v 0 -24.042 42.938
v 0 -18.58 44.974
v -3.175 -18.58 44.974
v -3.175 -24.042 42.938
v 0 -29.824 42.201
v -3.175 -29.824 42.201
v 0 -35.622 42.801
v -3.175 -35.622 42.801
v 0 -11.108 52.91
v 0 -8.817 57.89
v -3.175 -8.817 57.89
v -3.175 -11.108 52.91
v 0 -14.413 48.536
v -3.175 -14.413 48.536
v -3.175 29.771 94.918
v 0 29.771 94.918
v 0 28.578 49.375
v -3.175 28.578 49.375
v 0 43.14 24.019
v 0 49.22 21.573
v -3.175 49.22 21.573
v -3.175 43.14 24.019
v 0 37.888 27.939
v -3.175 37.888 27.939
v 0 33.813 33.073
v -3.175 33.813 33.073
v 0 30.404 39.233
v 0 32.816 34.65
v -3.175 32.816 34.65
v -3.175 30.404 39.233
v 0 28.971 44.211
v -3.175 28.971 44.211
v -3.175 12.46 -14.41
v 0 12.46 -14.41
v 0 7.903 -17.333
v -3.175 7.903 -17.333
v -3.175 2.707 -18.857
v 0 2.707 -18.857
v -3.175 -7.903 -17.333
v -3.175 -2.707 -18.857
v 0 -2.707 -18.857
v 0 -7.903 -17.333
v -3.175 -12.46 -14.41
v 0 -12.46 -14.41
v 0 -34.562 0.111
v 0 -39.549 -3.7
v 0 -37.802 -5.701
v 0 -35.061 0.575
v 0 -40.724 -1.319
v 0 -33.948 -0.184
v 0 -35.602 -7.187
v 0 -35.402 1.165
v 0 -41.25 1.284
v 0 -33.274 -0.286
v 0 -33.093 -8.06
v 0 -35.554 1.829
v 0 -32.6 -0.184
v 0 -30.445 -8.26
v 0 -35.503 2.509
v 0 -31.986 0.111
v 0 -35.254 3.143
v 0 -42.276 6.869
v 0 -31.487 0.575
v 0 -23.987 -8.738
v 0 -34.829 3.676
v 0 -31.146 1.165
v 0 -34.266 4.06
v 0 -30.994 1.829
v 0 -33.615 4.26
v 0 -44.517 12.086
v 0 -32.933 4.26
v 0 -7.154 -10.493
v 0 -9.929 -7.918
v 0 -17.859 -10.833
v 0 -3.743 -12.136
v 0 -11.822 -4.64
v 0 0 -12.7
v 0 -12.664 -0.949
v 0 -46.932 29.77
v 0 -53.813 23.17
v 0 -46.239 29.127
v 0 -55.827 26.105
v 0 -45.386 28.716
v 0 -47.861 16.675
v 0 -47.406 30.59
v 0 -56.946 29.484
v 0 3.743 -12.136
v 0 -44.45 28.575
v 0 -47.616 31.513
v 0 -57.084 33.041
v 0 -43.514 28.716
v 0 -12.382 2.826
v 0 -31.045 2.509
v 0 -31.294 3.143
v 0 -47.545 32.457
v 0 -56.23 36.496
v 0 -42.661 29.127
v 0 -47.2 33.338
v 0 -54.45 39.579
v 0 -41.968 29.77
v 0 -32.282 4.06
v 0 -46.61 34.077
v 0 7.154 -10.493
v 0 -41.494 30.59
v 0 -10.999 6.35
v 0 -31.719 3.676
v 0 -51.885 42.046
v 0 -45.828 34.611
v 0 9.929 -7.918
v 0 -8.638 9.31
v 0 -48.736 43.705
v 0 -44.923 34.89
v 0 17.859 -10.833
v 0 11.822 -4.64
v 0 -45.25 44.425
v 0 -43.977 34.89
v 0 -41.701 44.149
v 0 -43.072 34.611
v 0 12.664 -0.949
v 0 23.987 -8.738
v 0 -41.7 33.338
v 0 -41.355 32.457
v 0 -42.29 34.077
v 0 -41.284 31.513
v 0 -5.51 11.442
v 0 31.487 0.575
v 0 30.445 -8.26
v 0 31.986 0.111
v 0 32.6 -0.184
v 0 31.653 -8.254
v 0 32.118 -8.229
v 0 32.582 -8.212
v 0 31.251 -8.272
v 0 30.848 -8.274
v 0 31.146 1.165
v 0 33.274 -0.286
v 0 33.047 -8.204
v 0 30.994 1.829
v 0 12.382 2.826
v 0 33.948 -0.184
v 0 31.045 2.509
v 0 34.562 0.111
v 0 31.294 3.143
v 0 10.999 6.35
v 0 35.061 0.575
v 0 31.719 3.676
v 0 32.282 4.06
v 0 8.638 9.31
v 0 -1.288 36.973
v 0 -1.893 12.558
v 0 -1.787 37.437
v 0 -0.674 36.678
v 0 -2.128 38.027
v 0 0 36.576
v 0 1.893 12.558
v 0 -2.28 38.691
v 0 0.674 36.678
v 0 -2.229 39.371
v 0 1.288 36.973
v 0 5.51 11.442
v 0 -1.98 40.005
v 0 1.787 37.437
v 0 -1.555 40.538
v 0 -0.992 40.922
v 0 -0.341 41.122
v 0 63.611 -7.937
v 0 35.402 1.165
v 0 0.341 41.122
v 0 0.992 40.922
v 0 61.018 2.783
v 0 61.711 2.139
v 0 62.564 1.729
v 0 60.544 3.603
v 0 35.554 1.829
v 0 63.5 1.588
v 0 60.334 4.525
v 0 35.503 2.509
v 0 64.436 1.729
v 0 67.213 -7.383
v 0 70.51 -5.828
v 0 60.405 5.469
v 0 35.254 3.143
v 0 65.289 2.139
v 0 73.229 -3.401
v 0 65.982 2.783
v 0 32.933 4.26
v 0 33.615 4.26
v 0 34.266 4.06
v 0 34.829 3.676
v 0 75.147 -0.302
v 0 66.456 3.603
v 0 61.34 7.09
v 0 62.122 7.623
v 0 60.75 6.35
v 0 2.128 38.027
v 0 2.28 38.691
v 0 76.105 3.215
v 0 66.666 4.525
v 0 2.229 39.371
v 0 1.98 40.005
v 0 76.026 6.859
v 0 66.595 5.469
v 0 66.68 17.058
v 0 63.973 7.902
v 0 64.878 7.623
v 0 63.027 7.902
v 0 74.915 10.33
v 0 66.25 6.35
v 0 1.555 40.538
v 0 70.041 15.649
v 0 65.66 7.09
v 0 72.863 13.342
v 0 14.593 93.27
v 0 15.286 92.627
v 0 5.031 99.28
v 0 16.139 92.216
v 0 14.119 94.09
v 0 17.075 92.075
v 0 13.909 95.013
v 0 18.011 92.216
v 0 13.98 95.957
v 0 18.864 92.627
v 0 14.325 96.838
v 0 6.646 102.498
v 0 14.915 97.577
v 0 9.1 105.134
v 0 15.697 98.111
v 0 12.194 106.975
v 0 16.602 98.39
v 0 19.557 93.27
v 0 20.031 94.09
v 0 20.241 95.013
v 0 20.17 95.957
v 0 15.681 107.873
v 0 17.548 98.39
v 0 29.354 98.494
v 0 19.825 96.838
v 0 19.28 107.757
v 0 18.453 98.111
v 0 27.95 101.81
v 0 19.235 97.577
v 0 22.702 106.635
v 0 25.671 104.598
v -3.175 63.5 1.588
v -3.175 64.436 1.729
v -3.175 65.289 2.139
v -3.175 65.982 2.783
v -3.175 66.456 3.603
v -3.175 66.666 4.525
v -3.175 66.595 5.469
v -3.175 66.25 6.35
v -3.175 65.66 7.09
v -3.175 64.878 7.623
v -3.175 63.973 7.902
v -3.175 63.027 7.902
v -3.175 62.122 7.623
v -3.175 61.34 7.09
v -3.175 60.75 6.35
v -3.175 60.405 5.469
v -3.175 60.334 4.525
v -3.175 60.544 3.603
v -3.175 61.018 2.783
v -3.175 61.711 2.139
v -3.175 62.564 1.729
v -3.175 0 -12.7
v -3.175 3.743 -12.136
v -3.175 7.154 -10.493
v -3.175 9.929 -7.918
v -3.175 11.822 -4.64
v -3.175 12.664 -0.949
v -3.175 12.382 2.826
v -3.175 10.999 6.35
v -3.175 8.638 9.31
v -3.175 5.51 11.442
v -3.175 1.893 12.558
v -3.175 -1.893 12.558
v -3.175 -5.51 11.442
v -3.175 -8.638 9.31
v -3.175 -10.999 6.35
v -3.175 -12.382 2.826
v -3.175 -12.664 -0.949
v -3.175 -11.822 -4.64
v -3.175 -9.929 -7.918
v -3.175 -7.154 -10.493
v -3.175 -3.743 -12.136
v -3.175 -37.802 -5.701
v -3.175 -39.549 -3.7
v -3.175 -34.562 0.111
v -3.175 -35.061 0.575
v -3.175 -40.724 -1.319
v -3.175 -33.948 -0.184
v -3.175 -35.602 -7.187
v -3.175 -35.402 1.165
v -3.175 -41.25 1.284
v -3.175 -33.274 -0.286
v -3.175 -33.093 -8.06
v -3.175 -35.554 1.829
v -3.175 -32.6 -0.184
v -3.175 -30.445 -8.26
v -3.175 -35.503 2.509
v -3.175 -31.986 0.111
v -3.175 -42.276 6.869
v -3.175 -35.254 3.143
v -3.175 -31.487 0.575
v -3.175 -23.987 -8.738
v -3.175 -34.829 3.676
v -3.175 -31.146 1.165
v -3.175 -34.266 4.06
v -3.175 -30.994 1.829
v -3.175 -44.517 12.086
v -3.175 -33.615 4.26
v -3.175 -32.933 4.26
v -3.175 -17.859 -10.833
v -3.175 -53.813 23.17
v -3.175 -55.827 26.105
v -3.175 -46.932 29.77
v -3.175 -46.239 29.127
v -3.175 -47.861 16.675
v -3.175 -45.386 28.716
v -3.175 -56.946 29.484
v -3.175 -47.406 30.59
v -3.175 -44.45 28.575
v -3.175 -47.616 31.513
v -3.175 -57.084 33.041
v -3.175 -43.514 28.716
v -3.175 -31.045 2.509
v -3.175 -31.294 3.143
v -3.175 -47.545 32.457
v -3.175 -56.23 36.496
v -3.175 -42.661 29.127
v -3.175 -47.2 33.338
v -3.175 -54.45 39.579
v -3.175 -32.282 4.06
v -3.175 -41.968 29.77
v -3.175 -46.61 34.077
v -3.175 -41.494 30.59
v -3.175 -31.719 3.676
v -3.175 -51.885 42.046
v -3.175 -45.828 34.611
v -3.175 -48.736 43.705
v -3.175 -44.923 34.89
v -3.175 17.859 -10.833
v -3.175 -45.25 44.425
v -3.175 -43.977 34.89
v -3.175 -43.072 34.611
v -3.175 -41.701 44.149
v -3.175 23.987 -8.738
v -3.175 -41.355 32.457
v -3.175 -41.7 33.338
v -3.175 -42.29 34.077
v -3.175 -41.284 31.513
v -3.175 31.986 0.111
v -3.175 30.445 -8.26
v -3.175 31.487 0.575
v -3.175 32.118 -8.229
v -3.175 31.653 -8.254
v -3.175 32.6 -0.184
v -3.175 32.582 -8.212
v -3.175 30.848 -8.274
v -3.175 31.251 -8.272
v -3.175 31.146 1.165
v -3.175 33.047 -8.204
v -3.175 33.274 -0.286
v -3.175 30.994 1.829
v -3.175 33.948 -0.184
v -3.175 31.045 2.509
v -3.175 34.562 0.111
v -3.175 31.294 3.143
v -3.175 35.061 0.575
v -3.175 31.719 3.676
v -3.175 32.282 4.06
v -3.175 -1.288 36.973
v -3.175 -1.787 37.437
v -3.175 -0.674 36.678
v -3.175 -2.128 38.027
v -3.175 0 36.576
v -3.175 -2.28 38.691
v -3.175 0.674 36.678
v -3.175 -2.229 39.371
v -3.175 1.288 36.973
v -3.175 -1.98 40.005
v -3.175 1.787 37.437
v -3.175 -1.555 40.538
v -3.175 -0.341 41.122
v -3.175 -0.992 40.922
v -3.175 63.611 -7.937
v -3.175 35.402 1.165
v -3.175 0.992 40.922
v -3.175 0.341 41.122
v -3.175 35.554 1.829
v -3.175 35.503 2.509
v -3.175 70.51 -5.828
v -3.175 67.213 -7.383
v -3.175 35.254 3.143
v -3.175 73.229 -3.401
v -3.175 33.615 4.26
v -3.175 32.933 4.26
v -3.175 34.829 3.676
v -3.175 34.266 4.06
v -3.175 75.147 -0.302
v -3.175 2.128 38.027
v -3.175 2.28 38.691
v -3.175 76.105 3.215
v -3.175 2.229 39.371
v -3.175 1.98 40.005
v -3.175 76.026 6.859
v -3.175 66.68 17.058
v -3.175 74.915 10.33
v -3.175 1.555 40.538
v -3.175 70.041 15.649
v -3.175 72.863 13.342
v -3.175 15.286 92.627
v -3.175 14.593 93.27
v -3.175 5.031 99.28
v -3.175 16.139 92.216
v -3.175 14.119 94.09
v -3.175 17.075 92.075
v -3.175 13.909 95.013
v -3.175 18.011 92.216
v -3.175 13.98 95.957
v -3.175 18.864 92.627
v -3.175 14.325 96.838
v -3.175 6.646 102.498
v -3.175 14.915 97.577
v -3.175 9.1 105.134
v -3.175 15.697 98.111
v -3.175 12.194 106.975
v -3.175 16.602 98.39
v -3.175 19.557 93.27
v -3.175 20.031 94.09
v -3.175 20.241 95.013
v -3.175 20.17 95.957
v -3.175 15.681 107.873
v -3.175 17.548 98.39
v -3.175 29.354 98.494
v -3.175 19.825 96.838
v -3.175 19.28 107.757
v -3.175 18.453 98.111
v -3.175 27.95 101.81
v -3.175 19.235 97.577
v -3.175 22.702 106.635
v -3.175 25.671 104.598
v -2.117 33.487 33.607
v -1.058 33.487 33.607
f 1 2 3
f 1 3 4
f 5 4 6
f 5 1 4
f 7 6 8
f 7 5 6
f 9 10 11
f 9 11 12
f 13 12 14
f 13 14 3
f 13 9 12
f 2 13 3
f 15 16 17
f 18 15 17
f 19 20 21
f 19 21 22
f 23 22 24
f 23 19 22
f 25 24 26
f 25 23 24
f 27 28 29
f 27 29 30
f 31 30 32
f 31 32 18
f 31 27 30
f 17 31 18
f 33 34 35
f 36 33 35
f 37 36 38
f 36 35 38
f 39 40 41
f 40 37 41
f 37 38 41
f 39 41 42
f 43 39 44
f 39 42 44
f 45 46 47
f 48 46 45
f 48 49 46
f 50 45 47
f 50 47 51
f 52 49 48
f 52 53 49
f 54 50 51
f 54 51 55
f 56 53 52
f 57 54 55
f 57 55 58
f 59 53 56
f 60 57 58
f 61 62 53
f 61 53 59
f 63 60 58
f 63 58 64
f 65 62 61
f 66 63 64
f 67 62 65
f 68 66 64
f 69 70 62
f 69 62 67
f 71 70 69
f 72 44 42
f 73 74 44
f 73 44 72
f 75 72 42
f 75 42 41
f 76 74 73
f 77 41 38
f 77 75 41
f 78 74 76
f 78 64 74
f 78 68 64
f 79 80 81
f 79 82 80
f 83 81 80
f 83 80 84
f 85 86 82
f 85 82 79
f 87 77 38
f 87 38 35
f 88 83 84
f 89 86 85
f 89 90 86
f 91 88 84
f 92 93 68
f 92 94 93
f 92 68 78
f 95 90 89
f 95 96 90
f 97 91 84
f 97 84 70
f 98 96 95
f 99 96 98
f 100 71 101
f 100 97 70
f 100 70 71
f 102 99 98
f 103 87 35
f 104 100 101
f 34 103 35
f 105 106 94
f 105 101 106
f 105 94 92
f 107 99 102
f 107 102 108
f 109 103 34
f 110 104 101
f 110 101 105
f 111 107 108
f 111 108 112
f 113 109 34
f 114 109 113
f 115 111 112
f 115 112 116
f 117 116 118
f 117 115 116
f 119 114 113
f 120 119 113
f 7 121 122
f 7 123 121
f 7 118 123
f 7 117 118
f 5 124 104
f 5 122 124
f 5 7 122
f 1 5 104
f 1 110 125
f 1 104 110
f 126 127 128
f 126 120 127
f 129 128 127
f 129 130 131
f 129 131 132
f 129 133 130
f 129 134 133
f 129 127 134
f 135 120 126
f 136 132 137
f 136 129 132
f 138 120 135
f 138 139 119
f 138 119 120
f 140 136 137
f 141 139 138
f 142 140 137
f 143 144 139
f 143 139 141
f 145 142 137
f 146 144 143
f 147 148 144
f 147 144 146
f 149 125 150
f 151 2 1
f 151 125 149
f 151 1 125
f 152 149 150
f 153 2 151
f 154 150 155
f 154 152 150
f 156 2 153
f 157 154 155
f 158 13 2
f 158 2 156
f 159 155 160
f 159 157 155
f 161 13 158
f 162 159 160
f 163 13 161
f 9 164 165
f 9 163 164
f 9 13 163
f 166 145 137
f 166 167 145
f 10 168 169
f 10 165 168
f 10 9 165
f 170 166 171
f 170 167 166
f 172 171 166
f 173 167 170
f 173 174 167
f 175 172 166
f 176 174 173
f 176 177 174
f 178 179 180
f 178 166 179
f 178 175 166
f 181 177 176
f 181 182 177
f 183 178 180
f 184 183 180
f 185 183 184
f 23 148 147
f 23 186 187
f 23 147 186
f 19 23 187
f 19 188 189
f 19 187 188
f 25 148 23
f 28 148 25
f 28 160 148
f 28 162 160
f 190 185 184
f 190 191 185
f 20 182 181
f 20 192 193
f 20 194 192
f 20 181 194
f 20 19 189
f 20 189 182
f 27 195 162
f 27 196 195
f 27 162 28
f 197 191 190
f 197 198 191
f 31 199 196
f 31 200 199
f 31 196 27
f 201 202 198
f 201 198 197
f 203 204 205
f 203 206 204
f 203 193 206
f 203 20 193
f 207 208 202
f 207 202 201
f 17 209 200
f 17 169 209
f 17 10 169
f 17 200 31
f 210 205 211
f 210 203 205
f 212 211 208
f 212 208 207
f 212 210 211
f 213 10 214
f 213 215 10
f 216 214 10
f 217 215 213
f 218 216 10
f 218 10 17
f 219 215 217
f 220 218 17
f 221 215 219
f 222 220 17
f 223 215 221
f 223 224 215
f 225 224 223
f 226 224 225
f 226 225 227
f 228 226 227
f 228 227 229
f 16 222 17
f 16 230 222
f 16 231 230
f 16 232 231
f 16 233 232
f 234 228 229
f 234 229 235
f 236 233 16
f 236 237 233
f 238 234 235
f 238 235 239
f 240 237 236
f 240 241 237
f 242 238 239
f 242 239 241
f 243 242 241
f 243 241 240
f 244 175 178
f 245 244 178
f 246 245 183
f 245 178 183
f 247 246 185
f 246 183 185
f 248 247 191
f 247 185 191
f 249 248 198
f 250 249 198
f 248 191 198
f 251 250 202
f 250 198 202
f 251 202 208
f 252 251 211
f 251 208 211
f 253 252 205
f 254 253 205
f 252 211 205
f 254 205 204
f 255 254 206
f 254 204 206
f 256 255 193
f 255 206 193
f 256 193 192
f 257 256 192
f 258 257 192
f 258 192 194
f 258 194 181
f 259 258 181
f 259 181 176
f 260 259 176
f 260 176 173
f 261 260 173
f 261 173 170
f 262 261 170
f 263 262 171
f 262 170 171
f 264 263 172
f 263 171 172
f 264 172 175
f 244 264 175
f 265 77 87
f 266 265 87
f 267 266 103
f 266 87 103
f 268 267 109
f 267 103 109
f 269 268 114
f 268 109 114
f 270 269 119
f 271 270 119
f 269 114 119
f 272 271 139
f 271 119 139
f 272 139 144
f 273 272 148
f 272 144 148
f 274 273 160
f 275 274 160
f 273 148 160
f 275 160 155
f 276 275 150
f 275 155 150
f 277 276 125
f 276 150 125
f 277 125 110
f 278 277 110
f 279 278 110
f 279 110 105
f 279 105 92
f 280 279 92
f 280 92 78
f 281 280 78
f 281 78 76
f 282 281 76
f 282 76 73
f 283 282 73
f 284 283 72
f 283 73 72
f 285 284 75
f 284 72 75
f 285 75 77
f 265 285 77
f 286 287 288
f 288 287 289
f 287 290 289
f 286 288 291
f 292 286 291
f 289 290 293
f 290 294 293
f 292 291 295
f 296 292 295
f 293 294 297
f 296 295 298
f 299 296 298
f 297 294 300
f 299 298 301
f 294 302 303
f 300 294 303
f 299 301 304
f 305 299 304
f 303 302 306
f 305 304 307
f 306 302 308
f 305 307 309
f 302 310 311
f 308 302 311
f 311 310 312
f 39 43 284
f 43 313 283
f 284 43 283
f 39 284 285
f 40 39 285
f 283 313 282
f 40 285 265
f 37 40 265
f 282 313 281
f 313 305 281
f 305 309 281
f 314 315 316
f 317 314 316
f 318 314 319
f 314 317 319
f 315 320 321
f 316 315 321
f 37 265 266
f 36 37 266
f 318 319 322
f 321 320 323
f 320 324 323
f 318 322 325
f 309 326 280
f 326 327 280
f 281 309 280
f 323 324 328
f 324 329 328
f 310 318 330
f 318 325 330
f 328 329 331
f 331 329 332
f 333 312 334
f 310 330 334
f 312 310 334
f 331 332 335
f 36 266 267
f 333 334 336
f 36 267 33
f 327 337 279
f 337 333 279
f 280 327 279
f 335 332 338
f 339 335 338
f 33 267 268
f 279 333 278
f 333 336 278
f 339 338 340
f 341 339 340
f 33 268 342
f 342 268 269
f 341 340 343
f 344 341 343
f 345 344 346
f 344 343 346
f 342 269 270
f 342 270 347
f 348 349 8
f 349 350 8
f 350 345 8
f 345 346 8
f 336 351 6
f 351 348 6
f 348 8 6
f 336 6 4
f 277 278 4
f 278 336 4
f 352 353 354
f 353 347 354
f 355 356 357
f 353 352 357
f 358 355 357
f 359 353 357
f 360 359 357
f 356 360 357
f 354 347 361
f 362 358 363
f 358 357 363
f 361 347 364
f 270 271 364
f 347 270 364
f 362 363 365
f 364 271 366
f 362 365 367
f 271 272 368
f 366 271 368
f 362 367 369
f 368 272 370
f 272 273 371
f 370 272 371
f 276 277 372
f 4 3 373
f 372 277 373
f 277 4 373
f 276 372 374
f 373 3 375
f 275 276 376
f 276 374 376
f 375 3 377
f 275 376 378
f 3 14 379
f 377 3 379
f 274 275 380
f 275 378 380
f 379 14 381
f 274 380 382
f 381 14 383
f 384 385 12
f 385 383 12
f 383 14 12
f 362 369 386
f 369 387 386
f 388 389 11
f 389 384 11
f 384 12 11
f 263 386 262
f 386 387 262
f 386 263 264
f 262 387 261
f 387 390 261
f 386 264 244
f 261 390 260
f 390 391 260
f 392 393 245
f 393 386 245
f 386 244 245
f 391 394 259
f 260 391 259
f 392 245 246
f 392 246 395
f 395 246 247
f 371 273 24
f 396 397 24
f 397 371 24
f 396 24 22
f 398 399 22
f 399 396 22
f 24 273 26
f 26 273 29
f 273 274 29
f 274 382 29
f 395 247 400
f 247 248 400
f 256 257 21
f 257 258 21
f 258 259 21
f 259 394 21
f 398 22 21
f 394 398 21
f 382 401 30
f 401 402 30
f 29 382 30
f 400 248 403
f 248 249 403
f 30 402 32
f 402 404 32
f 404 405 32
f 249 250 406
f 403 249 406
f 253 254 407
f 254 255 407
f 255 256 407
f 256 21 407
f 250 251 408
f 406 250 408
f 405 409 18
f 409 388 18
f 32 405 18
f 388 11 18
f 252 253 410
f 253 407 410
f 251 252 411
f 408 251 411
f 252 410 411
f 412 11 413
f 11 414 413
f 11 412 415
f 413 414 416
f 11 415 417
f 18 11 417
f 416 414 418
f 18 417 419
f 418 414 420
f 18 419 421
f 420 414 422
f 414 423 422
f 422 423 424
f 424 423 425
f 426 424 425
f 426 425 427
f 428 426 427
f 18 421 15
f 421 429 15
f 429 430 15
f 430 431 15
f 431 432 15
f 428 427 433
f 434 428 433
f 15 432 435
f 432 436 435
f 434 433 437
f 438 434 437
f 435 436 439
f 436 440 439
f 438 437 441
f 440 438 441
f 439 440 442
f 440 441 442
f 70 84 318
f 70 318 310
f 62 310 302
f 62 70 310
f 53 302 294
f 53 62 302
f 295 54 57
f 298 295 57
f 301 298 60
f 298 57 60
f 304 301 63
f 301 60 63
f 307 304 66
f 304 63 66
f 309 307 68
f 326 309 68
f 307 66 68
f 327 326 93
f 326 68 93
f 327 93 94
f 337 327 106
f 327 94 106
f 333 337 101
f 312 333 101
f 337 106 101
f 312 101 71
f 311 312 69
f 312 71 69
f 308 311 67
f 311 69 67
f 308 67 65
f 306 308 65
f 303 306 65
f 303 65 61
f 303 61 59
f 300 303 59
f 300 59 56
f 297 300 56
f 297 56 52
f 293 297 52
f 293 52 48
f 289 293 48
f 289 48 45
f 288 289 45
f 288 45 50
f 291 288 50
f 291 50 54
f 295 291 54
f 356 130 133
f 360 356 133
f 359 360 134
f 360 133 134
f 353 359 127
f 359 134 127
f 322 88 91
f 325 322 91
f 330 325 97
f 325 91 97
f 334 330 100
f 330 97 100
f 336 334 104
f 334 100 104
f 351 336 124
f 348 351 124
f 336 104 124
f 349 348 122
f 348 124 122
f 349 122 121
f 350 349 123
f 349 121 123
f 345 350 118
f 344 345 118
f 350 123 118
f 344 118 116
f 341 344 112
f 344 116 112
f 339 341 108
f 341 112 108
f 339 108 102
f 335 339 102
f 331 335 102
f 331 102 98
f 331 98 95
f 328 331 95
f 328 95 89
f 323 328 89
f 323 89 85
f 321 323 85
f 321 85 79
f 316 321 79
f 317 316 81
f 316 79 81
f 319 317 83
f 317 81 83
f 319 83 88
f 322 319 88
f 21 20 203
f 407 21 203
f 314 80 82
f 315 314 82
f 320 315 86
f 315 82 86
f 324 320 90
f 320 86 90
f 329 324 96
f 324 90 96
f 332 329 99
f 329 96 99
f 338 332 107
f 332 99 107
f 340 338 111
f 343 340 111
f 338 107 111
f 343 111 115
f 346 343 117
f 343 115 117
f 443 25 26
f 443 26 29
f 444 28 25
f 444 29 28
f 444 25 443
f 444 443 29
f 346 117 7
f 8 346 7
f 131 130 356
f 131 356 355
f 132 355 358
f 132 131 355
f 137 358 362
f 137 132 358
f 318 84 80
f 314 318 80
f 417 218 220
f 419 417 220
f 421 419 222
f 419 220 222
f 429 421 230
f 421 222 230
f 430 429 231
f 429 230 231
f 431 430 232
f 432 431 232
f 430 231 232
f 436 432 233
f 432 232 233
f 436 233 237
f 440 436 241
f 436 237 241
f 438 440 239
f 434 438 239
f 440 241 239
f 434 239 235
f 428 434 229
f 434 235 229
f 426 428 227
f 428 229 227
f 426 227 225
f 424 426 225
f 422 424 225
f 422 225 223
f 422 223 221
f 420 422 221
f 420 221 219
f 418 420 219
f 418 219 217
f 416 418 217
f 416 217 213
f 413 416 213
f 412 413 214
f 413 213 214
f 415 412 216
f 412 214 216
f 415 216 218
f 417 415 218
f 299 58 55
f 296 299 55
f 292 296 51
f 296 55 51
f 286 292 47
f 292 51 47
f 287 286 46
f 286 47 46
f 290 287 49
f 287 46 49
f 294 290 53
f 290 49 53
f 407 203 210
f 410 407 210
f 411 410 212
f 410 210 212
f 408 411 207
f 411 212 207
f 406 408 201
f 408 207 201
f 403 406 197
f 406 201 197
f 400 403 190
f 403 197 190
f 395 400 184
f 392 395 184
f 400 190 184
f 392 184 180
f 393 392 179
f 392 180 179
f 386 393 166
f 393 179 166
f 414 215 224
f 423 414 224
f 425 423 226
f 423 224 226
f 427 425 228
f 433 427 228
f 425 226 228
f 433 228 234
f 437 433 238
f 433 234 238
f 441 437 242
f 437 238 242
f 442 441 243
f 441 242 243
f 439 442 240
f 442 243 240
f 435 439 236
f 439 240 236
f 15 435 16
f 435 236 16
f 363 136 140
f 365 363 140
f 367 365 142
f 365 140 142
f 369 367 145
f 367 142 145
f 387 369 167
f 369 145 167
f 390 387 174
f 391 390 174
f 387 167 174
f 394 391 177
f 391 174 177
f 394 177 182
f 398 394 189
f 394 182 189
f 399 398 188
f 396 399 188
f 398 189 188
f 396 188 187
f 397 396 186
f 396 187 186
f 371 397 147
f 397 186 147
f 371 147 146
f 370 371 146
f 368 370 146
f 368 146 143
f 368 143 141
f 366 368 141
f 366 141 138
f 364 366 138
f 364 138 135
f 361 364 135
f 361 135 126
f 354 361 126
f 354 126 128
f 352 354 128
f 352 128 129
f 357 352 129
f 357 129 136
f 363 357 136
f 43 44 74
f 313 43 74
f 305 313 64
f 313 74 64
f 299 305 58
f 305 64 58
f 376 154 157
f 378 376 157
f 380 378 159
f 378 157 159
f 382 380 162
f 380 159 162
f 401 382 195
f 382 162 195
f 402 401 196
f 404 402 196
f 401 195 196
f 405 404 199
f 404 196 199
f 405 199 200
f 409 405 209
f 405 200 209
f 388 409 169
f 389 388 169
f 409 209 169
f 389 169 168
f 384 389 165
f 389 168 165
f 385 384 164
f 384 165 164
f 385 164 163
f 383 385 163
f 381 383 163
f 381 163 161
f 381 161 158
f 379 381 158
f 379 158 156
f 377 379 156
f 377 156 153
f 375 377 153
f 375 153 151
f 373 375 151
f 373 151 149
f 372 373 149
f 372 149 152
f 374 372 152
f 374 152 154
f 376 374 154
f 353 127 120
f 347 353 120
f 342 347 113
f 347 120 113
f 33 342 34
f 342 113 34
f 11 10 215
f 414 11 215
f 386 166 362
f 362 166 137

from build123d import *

# Parameters (mm, degrees)
SKETCH1_W          = 101.6
SKETCH1_H          = 82.55
SKETCH1_R          = 12.7
BASE_FLANGE1_DEPTH = 3.175
SKETCH6_R          = 2.286
CUT_EXTRUDE1_DEPTH = 66.531261624
SKETCH7_R          = 3.175
TAB1_DEPTH         = 3.175
FILLET1_R          = 25.4


# Sheet-metal steps are written as plain solids
with BuildPart() as part:
    # Sketch1 → Base-Flange1 (new body)
    with BuildSketch(Plane(origin=(0, 0, 0), x_dir=(0, 0, -1), z_dir=(1, 0, 0))):
        Rectangle(SKETCH1_W, SKETCH1_H)
        Circle(SKETCH1_R, mode=Mode.SUBTRACT)
    extrude(amount=-BASE_FLANGE1_DEPTH)

    # Sketch6 → Cut-Extrude1 (cut, through all)
    with BuildSketch(Plane(origin=(0, 0, 0), x_dir=(0, 0, -1), z_dir=(1, 0, 0))):
        with BuildLine():
            Line((-50.8, 0), (-50.8, -41.275))
            Line((-50.8, -41.275), (-2, -41.275))
            add(Edge.make_bspline(
                [(-50.8, 0), (-49.405200746, -20.6375), (-31.743734825, -41.275), (-2, -41.275)],
                knots=[0.5, 0.5, 0.5, 0.5, 1, 1, 1, 1], degree=3))
        make_face()
        with BuildLine():
            ThreePointArc((8.260015314, -30.445283168), (5.45906631, -38.06667919), (-2, -41.275))
            Line((-2, -41.275), (50.8, -41.275))
            Line((50.8, -41.275), (50.8, 41.275))
            Line((50.8, 41.275), (-2, 41.275))
            ThreePointArc((-2, 41.275), (5.45906631, 38.06667919), (8.260015314, 30.445283168))
            ThreePointArc((8.260015314, 30.445283168), (9.58920866, 20.855850918), (14.409845519, 12.460291013))
            ThreePointArc((14.409845519, 12.460291013), (19.05, 0), (14.409845519, -12.460291013))
            ThreePointArc((14.409845519, -12.460291013), (9.58920866, -20.855850918), (8.260015314, -30.445283168))
        make_face()
        with BuildLine():
            Line((-50.8, 41.275), (-50.8, 5.257542394))
            add(Edge.make_bspline(
                [(-2, 41.275), (-34.31608403, 41.275), (-49.514685749, 24.001471649), (-50.8, 5.257542394)],
                knots=[0, 0, 0, 0, 0.457437737, 0.457437737, 0.457437737, 0.457437737], degree=3))
            Line((-2, 41.275), (-50.8, 41.275))
        make_face()
        with Locations((-38.862, 0)):
            Circle(SKETCH6_R)
        with Locations((-2, -33.274)):
            Circle(SKETCH6_R)
        with Locations((-2, 33.274)):
            Circle(SKETCH6_R)
    extrude(amount=-CUT_EXTRUDE1_DEPTH, mode=Mode.SUBTRACT)

    # Sketch7 → Tab1 (add)
    # profile 1 of 3: a face of its own
    with BuildSketch(Plane(origin=(0, 0, 0), x_dir=(0, 0, -1), z_dir=(1, 0, 0))):
        with BuildLine():
            Line((-94.917552756, 29.770648167), (-40.208700014, 28.33804644))
            add(Edge.make_bspline(
                [(-40.208700014, 28.33804644), (-46.786875633, 21.92230562), (-50.218303551, 13.740508394), (-50.8, 5.257542394)],
                knots=[0.250414508, 0.250414508, 0.250414508, 0.250414508, 0.457437737, 0.457437737, 0.457437737, 0.457437737], degree=3))
            Line((-50.8, 5.257542394), (-50.8, 0))
            add(Edge.make_bspline(
                [(-50.8, 0), (-50.523888569, -4.085354674), (-49.610330365, -8.170709348), (-48.091785573, -12.095969996)],
                knots=[0.5, 0.5, 0.5, 0.5, 0.598978914, 0.598978914, 0.598978914, 0.598978914], degree=3))
            Line((-48.091785573, -12.095969996), (-99.279769136, 5.031289719))
            ThreePointArc((-99.279769136, 5.031289719), (-107.757058463, 19.280331996), (-94.917552756, 29.770648167))
        make_face()
        with Locations((-95.25, 17.07500014)):
            Circle(SKETCH7_R, mode=Mode.SUBTRACT)
    # profile 2 of 3: a face of its own
    with BuildSketch(Plane(origin=(0, 0, 0), x_dir=(0, 0, -1), z_dir=(1, 0, 0))):
        with BuildLine():
            Line((-44.14895929, -41.701216903), (-40.415374595, -24.860104669))
            add(Edge.make_bspline(
                [(-40.415374595, -24.860104669), (-33.280436064, -33.135041664), (-22.659787261, -39.285311117), (-9.047775931, -40.872784018)],
                knots=[0.713798262, 0.713798262, 0.713798262, 0.713798262, 0.959139114, 0.959139114, 0.959139114, 0.959139114], degree=3))
            Line((-9.047775931, -40.872784018), (-23.170004363, -53.813422177))
            ThreePointArc((-23.170004363, -53.813422177), (-38.1, -55.448522628), (-44.14895929, -41.701216903))
        make_face()
        with Locations((-31.75, -44.45)):
            Circle(SKETCH7_R, mode=Mode.SUBTRACT)
    # profile 3 of 3: a face of its own
    with BuildSketch(Plane(origin=(0, 0, 0), x_dir=(0, 0, -1), z_dir=(1, 0, 0))):
        with BuildLine():
            Line((7.937016423, 63.610827001), (8.211666218, 32.13907772))
            ThreePointArc((8.211666218, 32.13907772), (4.850970786, 38.657664415), (-2, 41.275))
            add(Edge.make_bspline(
                [(-2, 41.275), (-10.740165269, 41.275), (-18.228222741, 40.011477764), (-24.527562549, 37.79707419)],
                knots=[0, 0, 0, 0, 0.123718004, 0.123718004, 0.123718004, 0.123718004], degree=3))
            Line((-24.527562549, 37.79707419), (-17.057975033, 66.679826051))
            ThreePointArc((-17.057975033, 66.679826051), (-3.214759339, 76.105336126), (7.937016423, 63.610827001))
        make_face()
        with Locations((-4.7625, 63.5)):
            Circle(SKETCH7_R, mode=Mode.SUBTRACT)
    extrude(amount=-TAB1_DEPTH)

    # Fillet1
    # the kernel refuses this fillet: 25.4 mm, written as the material it adds along each edge
    with BuildSketch(Plane(origin=(0, -12.095969996, 48.091785573), x_dir=(0, -0.8940853076070706, -0.44789670987982283), z_dir=(-1, 0, 0))) as fillet1_piece_1:
        with BuildLine():
            CenterArc((10.606420456, 25.28678712), FILLET1_R, 225.10881891, 39.479525683)
            Line((-7.319947942, 7.29219582), (-7.67847531, 6.932303994))
            Line((-7.67847531, 6.932303994), (-0.358527368, -0.359891826))
            Line((-0.358527368, -0.359891826), (0.04832888, -0.505695876))
            ThreePointArc((0.04832888, -0.505695876), (4.105397819, -0.313189565), (8.163015374, -0.505735742))
            Line((8.163015374, -0.505735742), (8.210925278, 0))
        make_face()
    extrude(amount=3.175)
    with BuildSketch(Plane(origin=(0, -24.860104669, 40.415374595), x_dir=(0, 0.8184198405618281, 0.5746207136666339), z_dir=(-1, 0, 0))) as fillet1_piece_2:
        with BuildLine():
            CenterArc((11.311656293, -25.273029086), FILLET1_R, 95.731310995, 41.841763873)
            Line((-7.437058628, -8.136935925), (-7.812032926, -7.794214062))
            Line((-7.812032926, -7.794214062), (-0.374974298, 0.342721863))
            Line((-0.374974298, 0.342721863), (0.050418969, 0.505491768))
            ThreePointArc((0.050418969, 0.505491768), (4.387605763, 0.289082367), (8.724392403, 0.505460582))
            Line((8.724392403, 0.505460582), (8.775123067, 0))
        make_face()
    extrude(amount=3.175)
    with BuildSketch(Plane(origin=(0, -40.872784018, 9.047775931), x_dir=(0, -0.04853483979472319, -0.9988214902204), z_dir=(-1, 0, 0))) as fillet1_piece_3:
        with BuildLine():
            CenterArc((10.770038636, 25.222537483), FILLET1_R, 224.718065589, 38.505093781)
            Line((-7.27863381, 7.350620325), (-9.083501055, 5.563428609))
            Line((-9.083501055, 5.563428609), (-1.804867245, -1.787191716))
            Line((-1.804867245, -1.787191716), (0.171432812, -2.534208119))
            ThreePointArc((0.171432812, -2.534208119), (6.935713053, -2.477327294), (7.473046138, -2.522253748))
            Line((7.473046138, -2.522253748), (7.772772728, 0))
        make_face()
    extrude(amount=3.175)
    with BuildSketch(Plane(origin=(0, 28.33804644, 40.208700014), x_dir=(0, 0.6273452084860717, -0.7787412852735929), z_dir=(-1, 0, 0))) as fillet1_piece_4:
        with BuildLine():
            CenterArc((9.459006839, -25.293729314), FILLET1_R, 95.242990238, 35.111537056)
            Line((-6.987881866, -5.937597161), (-7.31681964, -5.550474518))
            Line((-7.31681964, -5.550474518), (-0.328937774, 0.387122643))
            Line((-0.328937774, 0.387122643), (0.048065336, 0.505720994))
            ThreePointArc((0.048065336, 0.505720994), (3.568700205, 0.341549606), (7.091539297, 0.505874586))
            Line((7.091539297, 0.505874586), (7.137960229, 0))
        make_face()
    extrude(amount=3.175)
    with BuildSketch(Plane(origin=(0, 37.79707419, 24.527562549), x_dir=(0, -0.42252064373268267, 0.9063533006613478), z_dir=(-1, 0, 0))) as fillet1_piece_5:
        with BuildLine():
            CenterArc((12.096936965, 25.25943543), FILLET1_R, 219.493828852, 44.475589611)
            Line((-7.504067493, 9.105159703), (-7.896087582, 8.782074189))
            Line((-7.896087582, 8.782074189), (-0.392020089, -0.323085515))
            Line((-0.392020089, -0.323085515), (0.049799336, -0.505553188))
            ThreePointArc((0.049799336, -0.505553188), (4.714693558, -0.268029159), (9.375061322, -0.505188709))
            Line((9.375061322, -0.505188709), (9.428431432, 0))
        make_face()
    extrude(amount=3.175)
    with BuildSketch(Plane(origin=(0, 32.13907772, -8.211666218), x_dir=(0, -0.9961860509350137, -0.08725452379391116), z_dir=(-1, 0, 0))) as fillet1_piece_6:
        with BuildLine():
            CenterArc((1.089917285, -25.392853706), FILLET1_R, 91.359162517, 3.146518864)
            Line((-0.905454606, -0.071351164), (-0.945362044, 0.435078887))
            Line((-0.945362044, 0.435078887), (-0.039907438, 0.506430051))
            Line((-0.039907438, 0.506430051), (0.012049575, 0.507857074))
            ThreePointArc((0.012049575, 0.507857074), (0.243719262, 0.505109127), (0.47538895, 0.507857074))
            Line((0.47538895, 0.507857074), (0.487438525, 0))
        make_face()
    extrude(amount=3.175)


solid = part.part
